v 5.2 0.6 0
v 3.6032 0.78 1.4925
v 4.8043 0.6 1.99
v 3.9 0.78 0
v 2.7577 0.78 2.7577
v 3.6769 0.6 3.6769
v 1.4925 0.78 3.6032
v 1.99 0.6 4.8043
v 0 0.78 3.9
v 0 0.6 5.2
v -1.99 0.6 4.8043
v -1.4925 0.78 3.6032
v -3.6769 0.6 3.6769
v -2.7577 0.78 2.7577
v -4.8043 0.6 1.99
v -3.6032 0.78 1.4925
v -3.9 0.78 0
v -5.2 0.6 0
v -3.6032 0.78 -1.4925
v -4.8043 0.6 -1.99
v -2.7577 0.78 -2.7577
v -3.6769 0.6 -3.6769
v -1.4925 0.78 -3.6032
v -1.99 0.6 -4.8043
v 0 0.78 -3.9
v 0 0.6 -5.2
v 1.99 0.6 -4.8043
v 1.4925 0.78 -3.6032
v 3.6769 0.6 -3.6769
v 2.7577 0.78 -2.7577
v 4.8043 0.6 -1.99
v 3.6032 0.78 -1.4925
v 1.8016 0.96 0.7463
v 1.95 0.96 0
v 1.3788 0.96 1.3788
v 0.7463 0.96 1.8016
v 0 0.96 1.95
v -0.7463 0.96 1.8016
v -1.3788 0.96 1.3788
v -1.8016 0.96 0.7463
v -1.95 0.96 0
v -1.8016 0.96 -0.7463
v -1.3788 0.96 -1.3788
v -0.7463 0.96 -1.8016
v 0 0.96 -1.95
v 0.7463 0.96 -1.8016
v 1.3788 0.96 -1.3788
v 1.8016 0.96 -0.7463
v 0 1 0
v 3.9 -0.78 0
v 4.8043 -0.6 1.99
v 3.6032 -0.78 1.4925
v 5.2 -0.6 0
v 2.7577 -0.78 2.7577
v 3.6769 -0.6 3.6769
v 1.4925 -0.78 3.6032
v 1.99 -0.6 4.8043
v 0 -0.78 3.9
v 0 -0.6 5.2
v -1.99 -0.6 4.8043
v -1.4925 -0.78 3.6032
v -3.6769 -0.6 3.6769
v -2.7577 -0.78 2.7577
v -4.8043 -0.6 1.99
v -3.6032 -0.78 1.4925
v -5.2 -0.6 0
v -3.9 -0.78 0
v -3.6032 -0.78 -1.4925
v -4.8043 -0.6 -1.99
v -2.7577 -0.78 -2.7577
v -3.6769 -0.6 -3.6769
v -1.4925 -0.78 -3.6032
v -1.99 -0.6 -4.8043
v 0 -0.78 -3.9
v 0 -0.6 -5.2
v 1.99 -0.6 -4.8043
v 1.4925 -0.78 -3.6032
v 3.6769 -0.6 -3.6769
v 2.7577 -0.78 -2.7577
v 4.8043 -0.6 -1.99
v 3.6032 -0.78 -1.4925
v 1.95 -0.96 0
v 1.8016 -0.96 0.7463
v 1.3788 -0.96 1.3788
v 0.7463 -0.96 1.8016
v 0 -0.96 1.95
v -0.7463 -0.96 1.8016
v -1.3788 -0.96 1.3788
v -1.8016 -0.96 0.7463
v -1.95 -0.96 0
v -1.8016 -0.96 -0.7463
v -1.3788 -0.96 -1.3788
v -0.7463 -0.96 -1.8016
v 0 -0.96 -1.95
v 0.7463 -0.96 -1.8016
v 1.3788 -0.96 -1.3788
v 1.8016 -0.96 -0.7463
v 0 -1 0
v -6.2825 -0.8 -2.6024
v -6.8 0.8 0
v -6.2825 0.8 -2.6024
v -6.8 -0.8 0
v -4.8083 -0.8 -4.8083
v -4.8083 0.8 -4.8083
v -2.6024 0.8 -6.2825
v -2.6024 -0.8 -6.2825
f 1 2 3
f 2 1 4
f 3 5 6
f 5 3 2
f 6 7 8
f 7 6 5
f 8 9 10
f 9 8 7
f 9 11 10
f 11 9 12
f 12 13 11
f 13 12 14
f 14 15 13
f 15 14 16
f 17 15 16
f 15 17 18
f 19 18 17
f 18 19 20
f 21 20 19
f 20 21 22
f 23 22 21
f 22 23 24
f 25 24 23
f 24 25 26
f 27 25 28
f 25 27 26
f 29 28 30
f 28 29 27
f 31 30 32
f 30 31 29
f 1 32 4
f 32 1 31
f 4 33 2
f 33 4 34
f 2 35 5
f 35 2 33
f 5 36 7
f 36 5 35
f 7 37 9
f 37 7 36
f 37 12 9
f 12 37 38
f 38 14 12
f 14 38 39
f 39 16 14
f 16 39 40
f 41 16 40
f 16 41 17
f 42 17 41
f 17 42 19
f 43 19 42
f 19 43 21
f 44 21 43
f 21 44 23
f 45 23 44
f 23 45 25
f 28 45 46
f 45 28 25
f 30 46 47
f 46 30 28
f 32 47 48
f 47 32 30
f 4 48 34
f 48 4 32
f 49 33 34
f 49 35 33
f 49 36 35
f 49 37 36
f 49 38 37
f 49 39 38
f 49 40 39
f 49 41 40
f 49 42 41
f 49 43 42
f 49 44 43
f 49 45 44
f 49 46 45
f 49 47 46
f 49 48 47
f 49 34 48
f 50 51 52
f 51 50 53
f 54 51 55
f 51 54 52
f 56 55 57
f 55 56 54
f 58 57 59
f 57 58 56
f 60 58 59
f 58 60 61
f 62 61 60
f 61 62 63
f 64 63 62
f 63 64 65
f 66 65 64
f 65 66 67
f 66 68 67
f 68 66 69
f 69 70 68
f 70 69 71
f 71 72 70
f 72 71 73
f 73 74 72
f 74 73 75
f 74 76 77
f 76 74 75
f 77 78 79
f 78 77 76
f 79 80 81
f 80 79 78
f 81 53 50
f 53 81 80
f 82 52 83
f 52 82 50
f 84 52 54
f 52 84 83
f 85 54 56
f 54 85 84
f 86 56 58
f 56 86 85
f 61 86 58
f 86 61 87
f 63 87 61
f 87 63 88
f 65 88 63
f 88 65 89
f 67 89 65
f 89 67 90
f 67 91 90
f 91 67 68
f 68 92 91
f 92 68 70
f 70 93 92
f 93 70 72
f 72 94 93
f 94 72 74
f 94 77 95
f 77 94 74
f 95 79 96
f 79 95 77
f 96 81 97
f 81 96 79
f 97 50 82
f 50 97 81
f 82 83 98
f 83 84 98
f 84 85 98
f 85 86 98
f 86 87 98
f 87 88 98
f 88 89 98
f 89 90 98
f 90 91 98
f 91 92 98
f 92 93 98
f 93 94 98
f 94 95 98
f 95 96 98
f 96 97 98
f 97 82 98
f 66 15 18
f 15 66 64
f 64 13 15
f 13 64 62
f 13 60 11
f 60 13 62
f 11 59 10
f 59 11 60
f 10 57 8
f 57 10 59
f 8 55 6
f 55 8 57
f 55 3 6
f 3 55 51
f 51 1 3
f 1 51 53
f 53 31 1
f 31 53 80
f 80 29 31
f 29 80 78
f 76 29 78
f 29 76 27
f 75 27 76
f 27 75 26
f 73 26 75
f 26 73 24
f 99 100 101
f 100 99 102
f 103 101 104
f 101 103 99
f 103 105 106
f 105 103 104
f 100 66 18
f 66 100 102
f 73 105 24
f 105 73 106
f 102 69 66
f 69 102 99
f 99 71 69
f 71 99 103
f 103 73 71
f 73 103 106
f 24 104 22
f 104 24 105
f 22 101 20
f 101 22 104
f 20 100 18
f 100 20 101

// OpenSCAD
use <../../lib.scad>
use <../../p/13-16cyli.scad>
use <../../p/3-16cyli.scad>
use <../../p/3-16edge.scad>
use <../../p/bump5000.scad>
$fa=1; $fs=0.2;
function ldraw_lib__s__30152as01(realsolid=false) = [
// 0 ~Lens for Minifig Tool Magnifying Glass
// 0 Name: s\30152as01.dat
// 0 Author: Michael Heidemann [mikeheide]
// 0 !LDRAW_ORG Subpart UPDATE 2020-01
// 0 !LICENSE Licensed under CC BY 2.0 and CC BY 4.0 : see CAreadme.txt
// 
// 0 BFC CERTIFY CCW
  [0,"BFC","CERTIFY"],
  [0,"BFC","CCW"],
// 
// 0 !HISTORY 2008-11-15 [mikeheide] creation, based on the code of Jonathan Wilson
// 0 !HISTORY 2017-11-28 [GeraldLasser] Corrected Dimensions and Shape
// 0 !HISTORY 2020-06-28 [PTadmin] Official Update 2020-01
// 0 !HISTORY 2020-06-28 [PTadmin] Official Update 2020-01
// 
// 
// 0 BFC NOCLIP
  [0,"BFC","NOCLIP"],
// 
// 0 !HISTORY 2020-06-28 [PTadmin] Official Update 2020-01
// 
// 1 16 0 0 1.5 13 0 0 0 0 13 0 -2 0 bump5000.dat
  [1,16,0,0,1.5,13,0,0,0,0,13,0,-2,0, ldraw_lib__bump5000(realsolid)],
// 1 16 0 0 -1.5 13 0 0 0 0 13 0 2 0 bump5000.dat
  [1,16,0,0,-1.5,13,0,0,0,0,13,0,2,0, ldraw_lib__bump5000(realsolid)],
// 1 16 0 0 1.5 -13 0 0 0 0 -13 0 -3 0 13-16cyli.dat
  [1,16,0,0,1.5,-13,0,0,0,0,-13,0,-3,0, ldraw_lib__13_16cyli(realsolid)],
// 1 16 0 0 2 -17 0 0 0 0 17 0 -4 0 3-16cyli.dat
  [1,16,0,0,2,-17,0,0,0,0,17,0,-4,0, ldraw_lib__3_16cyli(realsolid)],
// 4 16 -13 0 -1.5 -13 0 1.5 -17 0 2 -17 0 -2
  [4,16,-13,0,-1.5,-13,0,1.5,-17,0,2,-17,0,-2],
// 4 16 -4.9751 12.0107 -1.5 -6.5059 15.7063 -2 -6.5059 15.7063 2 -4.9751 12.0107 1.5
  [4,16,-4.9751,12.0107,-1.5,-6.5059,15.7063,-2,-6.5059,15.7063,2,-4.9751,12.0107,1.5],
// 
// 1 16 0 0 -2 -17 0 0 0 0 17 0 1 0 3-16edge.dat
  [1,16,0,0,-2,-17,0,0,0,0,17,0,1,0, ldraw_lib__3_16edge(realsolid)],
// 1 16 0 0 2 -17 0 0 0 0 17 0 1 0 3-16edge.dat
  [1,16,0,0,2,-17,0,0,0,0,17,0,1,0, ldraw_lib__3_16edge(realsolid)],
// 2 24 -17 0 2 -17 0 -2
  [2,24,-17,0,2,-17,0,-2],
// 2 24 -6.5059 15.7063 2 -6.5059 15.7063 -2
  [2,24,-6.5059,15.7063,2,-6.5059,15.7063,-2],
// 2 24 -4.9751 12.0107 -1.5 -4.9751 12.0107 1.5
  [2,24,-4.9751,12.0107,-1.5,-4.9751,12.0107,1.5],
// 2 24 -13 0 -1.5 -13 0 1.5
  [2,24,-13,0,-1.5,-13,0,1.5],
// 
// 4 16 -12.0107 4.9751 -1.5 -13 0 -1.5 -17 0 -2 -15.7063 6.5059 -2
  [4,16,-12.0107,4.9751,-1.5,-13,0,-1.5,-17,0,-2,-15.7063,6.5059,-2],
// 4 16 -9.1923 9.1923 -1.5 -12.0107 4.9751 -1.5 -15.7063 6.5059 -2 -12.0207 12.0207 -2
  [4,16,-9.1923,9.1923,-1.5,-12.0107,4.9751,-1.5,-15.7063,6.5059,-2,-12.0207,12.0207,-2],
// 4 16 -4.9751 12.0107 -1.5 -9.1923 9.1923 -1.5 -12.0207 12.0207 -2 -6.5059 15.7063 -2
  [4,16,-4.9751,12.0107,-1.5,-9.1923,9.1923,-1.5,-12.0207,12.0207,-2,-6.5059,15.7063,-2],
// 4 16 -9.1923 9.1923 1.5 -4.9751 12.0107 1.5 -6.5059 15.7063 2 -12.0207 12.0207 2
  [4,16,-9.1923,9.1923,1.5,-4.9751,12.0107,1.5,-6.5059,15.7063,2,-12.0207,12.0207,2],
// 4 16 -12.0107 4.9751 1.5 -9.1923 9.1923 1.5 -12.0207 12.0207 2 -15.7063 6.5059 2
  [4,16,-12.0107,4.9751,1.5,-9.1923,9.1923,1.5,-12.0207,12.0207,2,-15.7063,6.5059,2],
// 4 16 -13 0 1.5 -12.0107 4.9751 1.5 -15.7063 6.5059 2 -17 0 2
  [4,16,-13,0,1.5,-12.0107,4.9751,1.5,-15.7063,6.5059,2,-17,0,2],
// 2 24 -17 0 2 -13 0 1.5
  [2,24,-17,0,2,-13,0,1.5],
// 2 24 -13 0 -1.5 -17 0 -2
  [2,24,-13,0,-1.5,-17,0,-2],
// 2 24 -6.5059 15.7063 -2 -4.9751 12.0107 -1.5
  [2,24,-6.5059,15.7063,-2,-4.9751,12.0107,-1.5],
// 2 24 -6.5059 15.7063 2 -4.9751 12.0107 1.5
  [2,24,-6.5059,15.7063,2,-4.9751,12.0107,1.5],
// 5 24 -15.7063 6.5059 -2 -12.0107 4.9751 -1.5 -12.0207 12.0207 -2 -17 0 -2
  [5,24,-15.7063,6.5059,-2,-12.0107,4.9751,-1.5,-12.0207,12.0207,-2,-17,0,-2],
// 5 24 -12.0207 12.0207 -2 -9.1923 9.1923 -1.5 -15.7063 6.5059 -2 -6.5059 15.7063 -2
  [5,24,-12.0207,12.0207,-2,-9.1923,9.1923,-1.5,-15.7063,6.5059,-2,-6.5059,15.7063,-2],
// 5 24 -12.0107 4.9751 1.5 -15.7063 6.5059 2 -17 0 2 -12.0207 12.0207 2
  [5,24,-12.0107,4.9751,1.5,-15.7063,6.5059,2,-17,0,2,-12.0207,12.0207,2],
// 5 24 -9.1923 9.1923 1.5 -12.0207 12.0207 2 -15.7063 6.5059 2 -6.5059 15.7063 2
  [5,24,-9.1923,9.1923,1.5,-12.0207,12.0207,2,-15.7063,6.5059,2,-6.5059,15.7063,2],
];
module ldraw_lib__s__30152as01(step=0, col=false, unit=2/5, alt=false, line=0.2, solid=!$preview)
    makepoly(ldraw_lib__s__30152as01(solid), step=step, col=col, unit=unit, alt=alt, line=line, solid=solid);
ldraw_lib__s__30152as01(line=0.2);
